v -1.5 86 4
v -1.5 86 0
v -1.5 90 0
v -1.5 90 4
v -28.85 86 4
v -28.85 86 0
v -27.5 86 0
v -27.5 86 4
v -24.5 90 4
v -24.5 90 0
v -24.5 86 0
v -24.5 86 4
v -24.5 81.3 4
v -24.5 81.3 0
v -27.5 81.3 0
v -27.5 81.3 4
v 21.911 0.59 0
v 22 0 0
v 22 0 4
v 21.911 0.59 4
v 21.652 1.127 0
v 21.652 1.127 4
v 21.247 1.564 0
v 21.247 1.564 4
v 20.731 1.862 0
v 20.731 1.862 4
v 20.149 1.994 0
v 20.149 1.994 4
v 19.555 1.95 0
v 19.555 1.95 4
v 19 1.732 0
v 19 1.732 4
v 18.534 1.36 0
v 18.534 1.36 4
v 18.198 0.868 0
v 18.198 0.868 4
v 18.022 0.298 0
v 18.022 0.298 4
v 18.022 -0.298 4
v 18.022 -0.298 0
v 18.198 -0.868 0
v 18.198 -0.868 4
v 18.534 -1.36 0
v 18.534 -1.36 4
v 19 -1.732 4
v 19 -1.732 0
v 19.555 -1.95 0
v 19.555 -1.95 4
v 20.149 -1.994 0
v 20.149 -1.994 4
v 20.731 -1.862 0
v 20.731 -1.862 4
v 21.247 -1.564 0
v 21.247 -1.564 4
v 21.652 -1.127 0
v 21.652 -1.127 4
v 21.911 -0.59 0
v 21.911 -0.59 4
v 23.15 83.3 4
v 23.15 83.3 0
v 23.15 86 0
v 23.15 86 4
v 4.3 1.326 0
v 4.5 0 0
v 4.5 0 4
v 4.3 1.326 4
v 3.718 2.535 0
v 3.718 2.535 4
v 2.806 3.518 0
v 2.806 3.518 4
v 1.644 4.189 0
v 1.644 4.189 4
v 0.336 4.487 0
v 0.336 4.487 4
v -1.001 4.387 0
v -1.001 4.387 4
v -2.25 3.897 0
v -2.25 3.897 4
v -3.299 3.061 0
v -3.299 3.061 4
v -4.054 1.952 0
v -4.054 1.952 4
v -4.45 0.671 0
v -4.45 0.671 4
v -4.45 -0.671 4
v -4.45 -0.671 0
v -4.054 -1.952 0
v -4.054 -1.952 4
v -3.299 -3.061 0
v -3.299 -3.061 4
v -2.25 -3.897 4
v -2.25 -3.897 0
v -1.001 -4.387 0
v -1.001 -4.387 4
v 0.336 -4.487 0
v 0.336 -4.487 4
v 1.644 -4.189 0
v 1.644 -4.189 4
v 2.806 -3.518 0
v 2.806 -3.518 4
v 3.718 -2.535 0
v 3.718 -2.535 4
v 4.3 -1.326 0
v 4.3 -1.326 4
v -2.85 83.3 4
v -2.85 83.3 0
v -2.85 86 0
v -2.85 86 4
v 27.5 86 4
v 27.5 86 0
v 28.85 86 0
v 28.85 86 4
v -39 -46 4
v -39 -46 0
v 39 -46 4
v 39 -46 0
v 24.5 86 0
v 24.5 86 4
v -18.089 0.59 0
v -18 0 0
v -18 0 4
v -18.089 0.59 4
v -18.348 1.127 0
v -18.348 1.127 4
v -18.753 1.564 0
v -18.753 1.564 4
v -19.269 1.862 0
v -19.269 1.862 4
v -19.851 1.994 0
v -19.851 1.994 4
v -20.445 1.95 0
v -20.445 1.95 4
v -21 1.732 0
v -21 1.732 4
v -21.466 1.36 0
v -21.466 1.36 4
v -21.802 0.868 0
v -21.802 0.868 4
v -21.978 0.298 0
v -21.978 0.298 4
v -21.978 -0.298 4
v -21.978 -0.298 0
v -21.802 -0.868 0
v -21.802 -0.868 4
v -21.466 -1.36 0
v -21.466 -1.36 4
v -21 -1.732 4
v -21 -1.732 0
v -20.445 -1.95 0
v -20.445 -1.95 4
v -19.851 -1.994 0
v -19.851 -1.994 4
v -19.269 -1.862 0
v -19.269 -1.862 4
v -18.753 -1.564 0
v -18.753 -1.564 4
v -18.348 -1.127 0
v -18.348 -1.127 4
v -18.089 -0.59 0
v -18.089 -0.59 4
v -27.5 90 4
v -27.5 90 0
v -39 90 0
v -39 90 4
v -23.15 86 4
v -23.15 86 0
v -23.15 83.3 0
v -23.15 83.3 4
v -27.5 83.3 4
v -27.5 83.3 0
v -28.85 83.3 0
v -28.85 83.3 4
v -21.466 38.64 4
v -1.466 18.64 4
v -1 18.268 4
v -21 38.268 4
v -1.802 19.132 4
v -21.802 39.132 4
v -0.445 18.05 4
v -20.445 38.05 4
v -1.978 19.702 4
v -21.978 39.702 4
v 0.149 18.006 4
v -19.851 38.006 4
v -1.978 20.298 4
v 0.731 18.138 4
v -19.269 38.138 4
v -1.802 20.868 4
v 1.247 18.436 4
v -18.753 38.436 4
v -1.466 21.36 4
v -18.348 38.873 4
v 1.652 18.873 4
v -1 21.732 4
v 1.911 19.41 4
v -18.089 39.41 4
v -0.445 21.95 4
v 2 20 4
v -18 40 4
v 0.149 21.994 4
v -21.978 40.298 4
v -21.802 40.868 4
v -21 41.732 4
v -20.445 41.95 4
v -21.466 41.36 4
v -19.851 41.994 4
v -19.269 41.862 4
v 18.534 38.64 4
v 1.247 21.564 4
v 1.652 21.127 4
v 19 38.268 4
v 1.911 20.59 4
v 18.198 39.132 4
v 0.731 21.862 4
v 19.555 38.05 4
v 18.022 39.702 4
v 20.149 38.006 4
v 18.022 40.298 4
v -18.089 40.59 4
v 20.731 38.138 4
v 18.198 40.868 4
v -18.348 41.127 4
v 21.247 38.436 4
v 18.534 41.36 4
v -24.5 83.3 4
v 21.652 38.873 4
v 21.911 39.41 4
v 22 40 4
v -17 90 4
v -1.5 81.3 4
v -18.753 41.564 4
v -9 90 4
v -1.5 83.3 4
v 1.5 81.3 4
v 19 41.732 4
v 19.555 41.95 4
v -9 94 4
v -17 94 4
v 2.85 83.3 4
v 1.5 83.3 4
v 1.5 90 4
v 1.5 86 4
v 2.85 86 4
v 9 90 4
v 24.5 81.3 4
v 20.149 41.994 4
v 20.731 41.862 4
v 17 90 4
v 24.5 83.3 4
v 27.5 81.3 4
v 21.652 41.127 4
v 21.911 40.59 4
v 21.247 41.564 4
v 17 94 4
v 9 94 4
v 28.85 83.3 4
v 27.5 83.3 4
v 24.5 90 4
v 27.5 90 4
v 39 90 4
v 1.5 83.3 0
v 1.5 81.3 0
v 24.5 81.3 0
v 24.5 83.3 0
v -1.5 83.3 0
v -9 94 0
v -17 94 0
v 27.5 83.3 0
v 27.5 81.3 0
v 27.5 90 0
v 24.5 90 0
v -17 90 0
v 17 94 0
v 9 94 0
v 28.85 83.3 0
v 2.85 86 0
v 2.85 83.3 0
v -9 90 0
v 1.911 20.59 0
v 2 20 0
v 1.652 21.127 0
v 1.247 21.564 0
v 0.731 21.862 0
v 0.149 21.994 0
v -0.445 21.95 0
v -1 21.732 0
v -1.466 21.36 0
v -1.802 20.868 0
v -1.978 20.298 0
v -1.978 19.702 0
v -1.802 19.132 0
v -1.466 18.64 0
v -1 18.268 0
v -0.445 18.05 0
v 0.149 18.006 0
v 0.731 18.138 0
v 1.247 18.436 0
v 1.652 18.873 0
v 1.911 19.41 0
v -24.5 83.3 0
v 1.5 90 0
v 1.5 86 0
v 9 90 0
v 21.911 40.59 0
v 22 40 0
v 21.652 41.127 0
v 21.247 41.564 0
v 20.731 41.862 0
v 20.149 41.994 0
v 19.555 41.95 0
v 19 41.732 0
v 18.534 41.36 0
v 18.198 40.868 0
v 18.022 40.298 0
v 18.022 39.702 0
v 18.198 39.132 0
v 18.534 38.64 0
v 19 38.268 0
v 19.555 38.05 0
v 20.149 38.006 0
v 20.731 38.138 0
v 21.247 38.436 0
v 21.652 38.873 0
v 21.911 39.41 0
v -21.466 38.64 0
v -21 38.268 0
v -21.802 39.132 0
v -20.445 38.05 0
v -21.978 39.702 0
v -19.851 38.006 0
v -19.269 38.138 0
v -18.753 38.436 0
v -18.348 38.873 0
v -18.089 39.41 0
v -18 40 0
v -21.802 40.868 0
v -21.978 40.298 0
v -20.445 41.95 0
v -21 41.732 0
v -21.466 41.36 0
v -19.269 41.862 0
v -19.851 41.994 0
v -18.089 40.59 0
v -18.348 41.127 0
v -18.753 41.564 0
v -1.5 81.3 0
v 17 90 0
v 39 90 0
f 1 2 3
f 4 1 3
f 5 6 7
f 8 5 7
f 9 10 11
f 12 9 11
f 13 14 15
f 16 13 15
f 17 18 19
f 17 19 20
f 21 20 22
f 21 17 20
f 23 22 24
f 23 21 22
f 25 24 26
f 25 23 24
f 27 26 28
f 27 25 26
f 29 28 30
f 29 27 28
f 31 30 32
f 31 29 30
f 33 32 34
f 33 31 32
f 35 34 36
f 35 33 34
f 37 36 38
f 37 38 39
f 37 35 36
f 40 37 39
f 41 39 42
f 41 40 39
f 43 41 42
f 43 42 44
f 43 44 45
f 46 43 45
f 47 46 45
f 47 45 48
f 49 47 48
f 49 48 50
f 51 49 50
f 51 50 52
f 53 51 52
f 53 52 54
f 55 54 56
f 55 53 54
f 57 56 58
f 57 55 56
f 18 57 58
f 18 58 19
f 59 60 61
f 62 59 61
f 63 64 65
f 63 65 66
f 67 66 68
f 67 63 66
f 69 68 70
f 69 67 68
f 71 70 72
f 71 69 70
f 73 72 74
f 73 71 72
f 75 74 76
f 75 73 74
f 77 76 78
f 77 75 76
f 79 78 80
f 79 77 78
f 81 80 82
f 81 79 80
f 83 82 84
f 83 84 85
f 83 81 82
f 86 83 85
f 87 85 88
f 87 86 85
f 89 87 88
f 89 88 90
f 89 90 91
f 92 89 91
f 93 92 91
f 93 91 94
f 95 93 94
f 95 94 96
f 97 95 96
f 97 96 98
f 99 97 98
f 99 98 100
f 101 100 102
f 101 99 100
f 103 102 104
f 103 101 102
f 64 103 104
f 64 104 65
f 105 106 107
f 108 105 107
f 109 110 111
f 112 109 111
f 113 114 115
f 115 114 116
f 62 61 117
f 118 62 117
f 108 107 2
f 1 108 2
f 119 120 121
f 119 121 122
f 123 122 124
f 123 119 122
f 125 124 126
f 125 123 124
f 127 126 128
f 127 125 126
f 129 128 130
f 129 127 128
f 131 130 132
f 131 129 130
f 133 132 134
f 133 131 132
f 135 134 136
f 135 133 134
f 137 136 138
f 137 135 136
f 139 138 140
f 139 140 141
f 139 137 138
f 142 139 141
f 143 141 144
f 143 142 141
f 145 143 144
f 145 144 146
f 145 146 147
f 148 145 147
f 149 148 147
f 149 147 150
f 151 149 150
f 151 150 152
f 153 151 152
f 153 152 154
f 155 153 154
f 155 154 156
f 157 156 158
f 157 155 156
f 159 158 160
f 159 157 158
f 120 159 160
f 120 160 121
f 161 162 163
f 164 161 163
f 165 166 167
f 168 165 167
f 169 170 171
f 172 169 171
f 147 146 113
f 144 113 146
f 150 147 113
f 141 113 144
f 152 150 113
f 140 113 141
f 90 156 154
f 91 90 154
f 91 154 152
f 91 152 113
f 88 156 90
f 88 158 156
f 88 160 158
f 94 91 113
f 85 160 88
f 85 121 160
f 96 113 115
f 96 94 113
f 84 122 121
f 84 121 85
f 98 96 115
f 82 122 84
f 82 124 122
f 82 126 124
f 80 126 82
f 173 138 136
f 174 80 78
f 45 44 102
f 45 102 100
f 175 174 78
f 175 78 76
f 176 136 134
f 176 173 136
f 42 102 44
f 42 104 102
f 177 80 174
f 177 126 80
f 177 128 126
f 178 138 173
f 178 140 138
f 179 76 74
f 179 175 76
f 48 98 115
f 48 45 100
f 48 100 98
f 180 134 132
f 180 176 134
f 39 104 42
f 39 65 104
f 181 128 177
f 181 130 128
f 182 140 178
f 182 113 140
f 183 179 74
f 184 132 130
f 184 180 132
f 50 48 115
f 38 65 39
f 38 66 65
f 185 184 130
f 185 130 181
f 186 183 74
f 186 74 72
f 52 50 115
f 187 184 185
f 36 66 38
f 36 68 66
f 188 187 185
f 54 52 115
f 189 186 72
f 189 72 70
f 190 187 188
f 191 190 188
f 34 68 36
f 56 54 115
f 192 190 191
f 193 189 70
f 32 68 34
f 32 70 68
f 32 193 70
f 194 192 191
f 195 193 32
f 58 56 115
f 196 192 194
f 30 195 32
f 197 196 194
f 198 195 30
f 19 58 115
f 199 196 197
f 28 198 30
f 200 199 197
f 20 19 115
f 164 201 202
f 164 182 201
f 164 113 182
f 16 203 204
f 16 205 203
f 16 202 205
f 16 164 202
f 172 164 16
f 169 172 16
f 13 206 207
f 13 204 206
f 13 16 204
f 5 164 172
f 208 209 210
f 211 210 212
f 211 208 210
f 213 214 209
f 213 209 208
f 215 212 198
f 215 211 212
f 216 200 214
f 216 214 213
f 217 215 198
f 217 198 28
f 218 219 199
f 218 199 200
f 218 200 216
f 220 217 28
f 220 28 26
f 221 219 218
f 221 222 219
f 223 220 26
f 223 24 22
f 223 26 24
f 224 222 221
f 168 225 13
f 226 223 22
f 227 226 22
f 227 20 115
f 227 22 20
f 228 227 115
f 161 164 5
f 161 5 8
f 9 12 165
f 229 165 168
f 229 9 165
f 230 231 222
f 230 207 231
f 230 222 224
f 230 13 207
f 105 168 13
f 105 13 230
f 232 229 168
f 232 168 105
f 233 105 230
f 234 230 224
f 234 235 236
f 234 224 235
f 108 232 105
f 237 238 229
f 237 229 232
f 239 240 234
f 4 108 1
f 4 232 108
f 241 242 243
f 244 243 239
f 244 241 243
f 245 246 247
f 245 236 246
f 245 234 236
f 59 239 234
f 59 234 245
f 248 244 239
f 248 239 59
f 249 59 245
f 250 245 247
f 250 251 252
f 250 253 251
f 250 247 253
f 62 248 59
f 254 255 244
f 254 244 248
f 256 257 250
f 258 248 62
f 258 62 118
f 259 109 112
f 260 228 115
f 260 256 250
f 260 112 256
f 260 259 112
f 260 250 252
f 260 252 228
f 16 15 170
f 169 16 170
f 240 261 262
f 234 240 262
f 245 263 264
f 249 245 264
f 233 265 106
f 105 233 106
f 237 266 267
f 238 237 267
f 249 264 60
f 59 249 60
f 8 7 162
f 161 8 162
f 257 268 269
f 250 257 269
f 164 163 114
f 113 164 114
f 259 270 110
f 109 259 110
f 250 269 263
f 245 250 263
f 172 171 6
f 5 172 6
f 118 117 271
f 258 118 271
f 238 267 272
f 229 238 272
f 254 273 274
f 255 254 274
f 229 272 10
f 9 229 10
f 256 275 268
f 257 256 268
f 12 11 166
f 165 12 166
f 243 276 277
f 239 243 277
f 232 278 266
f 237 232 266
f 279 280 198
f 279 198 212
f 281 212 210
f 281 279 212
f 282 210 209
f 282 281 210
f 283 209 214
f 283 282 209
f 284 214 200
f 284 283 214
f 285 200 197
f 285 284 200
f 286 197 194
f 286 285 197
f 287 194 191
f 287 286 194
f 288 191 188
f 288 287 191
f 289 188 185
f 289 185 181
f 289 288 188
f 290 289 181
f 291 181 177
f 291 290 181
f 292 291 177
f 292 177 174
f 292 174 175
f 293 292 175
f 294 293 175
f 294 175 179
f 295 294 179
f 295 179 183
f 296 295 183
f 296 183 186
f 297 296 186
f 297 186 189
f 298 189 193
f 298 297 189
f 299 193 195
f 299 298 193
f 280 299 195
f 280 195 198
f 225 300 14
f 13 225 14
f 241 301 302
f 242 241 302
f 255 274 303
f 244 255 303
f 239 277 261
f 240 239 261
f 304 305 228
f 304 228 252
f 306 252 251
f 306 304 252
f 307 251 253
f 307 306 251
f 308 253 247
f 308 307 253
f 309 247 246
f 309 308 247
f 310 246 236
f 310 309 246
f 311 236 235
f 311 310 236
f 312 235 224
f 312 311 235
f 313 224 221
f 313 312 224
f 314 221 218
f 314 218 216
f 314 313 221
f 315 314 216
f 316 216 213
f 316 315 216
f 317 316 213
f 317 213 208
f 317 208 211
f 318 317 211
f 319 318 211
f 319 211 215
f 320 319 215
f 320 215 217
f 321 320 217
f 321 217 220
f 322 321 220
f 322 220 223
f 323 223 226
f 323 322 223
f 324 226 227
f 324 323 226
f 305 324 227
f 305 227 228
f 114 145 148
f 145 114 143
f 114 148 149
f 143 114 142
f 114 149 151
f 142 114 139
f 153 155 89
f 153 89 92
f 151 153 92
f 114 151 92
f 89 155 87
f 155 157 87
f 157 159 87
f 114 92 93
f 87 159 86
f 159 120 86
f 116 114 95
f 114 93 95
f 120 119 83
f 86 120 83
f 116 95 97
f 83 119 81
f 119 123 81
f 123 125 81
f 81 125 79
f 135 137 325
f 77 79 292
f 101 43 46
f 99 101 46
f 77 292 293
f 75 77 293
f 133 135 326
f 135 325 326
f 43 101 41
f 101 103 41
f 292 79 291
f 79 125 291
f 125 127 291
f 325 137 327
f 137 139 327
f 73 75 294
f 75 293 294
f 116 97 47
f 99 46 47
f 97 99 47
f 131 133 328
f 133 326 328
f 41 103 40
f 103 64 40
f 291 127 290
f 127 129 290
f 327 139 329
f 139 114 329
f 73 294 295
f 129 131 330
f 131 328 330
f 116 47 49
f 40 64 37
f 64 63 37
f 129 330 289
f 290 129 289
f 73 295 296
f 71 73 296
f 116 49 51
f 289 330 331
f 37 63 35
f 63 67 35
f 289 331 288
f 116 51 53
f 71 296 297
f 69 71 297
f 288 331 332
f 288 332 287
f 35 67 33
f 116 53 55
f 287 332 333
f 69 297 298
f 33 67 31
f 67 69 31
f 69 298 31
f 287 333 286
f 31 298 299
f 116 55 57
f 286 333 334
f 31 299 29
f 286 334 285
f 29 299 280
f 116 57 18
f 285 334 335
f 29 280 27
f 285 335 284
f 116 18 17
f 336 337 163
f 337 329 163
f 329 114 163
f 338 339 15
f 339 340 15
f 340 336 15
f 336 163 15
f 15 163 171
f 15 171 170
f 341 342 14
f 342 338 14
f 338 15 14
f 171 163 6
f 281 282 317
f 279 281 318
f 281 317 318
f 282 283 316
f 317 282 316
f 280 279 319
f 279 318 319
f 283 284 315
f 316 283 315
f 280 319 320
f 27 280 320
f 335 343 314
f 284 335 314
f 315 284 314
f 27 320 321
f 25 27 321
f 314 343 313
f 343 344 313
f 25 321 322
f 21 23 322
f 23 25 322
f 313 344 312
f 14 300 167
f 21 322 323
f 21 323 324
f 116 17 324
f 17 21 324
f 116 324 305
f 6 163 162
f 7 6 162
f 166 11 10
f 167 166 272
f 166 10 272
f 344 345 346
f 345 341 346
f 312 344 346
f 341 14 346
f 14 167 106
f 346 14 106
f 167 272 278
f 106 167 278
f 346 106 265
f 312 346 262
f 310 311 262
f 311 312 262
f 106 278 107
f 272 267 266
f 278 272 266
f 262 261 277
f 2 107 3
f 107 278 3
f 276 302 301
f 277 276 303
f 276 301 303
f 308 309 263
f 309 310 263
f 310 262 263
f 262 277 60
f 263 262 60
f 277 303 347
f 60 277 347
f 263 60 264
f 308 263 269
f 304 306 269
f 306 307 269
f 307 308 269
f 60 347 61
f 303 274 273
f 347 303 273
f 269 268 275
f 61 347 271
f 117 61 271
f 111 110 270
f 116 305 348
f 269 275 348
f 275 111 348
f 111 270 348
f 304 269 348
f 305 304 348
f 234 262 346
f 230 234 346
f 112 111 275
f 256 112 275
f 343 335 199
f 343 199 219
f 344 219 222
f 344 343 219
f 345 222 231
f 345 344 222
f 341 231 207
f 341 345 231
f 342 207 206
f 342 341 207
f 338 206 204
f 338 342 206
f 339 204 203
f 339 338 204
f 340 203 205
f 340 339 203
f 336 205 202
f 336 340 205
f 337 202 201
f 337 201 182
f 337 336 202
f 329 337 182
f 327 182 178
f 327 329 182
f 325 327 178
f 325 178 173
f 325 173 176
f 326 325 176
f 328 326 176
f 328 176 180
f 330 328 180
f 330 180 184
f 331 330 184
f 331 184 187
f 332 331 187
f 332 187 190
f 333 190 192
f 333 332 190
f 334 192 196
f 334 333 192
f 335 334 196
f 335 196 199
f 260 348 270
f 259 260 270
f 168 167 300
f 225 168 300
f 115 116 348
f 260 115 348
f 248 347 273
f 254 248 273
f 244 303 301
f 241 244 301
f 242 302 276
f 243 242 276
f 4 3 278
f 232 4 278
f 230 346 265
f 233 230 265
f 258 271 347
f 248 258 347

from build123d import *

# Parameters (mm, degrees)
SKETCH_1_R      = 4.5
SKETCH_1_R_2    = 2
EXTRUDE_1_DEPTH = 4


with BuildPart() as part:
    # 草图1 → 凸台-拉伸1 (new body)
    with BuildSketch(Plane.XY):
        Polygon((-39, 90), (-39, -46), (39, -46), (39, 90), (27.5, 90), (27.5, 86), (28.85, 86), (28.85, 83.3), (27.5, 83.3), (27.5, 81.3), (24.5, 81.3), (24.5, 83.3), (23.15, 83.3), (23.15, 86), (24.5, 86), (24.5, 90), (17, 90), (17, 94), (9, 94), (9, 90), (1.5, 90), (1.5, 86), (2.85, 86), (2.85, 83.3), (1.5, 83.3), (1.5, 81.3), (-1.5, 81.3), (-1.5, 83.3), (-2.85, 83.3), (-2.85, 86), (-1.5, 86), (-1.5, 90), (-9, 90), (-9, 94), (-17, 94), (-17, 90), (-24.5, 90), (-24.5, 86), (-23.15, 86), (-23.15, 83.3), (-24.5, 83.3), (-24.5, 81.3), (-27.5, 81.3), (-27.5, 83.3), (-28.85, 83.3), (-28.85, 86), (-27.5, 86), (-27.5, 90), align=None)
        Circle(SKETCH_1_R, mode=Mode.SUBTRACT)
        with Locations((20, 0)):
            Circle(SKETCH_1_R_2, mode=Mode.SUBTRACT)
        with Locations((0, 20)):
            Circle(SKETCH_1_R_2, mode=Mode.SUBTRACT)
        with Locations((-20, 40)):
            Circle(SKETCH_1_R_2, mode=Mode.SUBTRACT)
        with Locations((-20, 0)):
            Circle(SKETCH_1_R_2, mode=Mode.SUBTRACT)
        with Locations((20, 40)):
            Circle(SKETCH_1_R_2, mode=Mode.SUBTRACT)
    extrude(amount=EXTRUDE_1_DEPTH)


solid = part.part
